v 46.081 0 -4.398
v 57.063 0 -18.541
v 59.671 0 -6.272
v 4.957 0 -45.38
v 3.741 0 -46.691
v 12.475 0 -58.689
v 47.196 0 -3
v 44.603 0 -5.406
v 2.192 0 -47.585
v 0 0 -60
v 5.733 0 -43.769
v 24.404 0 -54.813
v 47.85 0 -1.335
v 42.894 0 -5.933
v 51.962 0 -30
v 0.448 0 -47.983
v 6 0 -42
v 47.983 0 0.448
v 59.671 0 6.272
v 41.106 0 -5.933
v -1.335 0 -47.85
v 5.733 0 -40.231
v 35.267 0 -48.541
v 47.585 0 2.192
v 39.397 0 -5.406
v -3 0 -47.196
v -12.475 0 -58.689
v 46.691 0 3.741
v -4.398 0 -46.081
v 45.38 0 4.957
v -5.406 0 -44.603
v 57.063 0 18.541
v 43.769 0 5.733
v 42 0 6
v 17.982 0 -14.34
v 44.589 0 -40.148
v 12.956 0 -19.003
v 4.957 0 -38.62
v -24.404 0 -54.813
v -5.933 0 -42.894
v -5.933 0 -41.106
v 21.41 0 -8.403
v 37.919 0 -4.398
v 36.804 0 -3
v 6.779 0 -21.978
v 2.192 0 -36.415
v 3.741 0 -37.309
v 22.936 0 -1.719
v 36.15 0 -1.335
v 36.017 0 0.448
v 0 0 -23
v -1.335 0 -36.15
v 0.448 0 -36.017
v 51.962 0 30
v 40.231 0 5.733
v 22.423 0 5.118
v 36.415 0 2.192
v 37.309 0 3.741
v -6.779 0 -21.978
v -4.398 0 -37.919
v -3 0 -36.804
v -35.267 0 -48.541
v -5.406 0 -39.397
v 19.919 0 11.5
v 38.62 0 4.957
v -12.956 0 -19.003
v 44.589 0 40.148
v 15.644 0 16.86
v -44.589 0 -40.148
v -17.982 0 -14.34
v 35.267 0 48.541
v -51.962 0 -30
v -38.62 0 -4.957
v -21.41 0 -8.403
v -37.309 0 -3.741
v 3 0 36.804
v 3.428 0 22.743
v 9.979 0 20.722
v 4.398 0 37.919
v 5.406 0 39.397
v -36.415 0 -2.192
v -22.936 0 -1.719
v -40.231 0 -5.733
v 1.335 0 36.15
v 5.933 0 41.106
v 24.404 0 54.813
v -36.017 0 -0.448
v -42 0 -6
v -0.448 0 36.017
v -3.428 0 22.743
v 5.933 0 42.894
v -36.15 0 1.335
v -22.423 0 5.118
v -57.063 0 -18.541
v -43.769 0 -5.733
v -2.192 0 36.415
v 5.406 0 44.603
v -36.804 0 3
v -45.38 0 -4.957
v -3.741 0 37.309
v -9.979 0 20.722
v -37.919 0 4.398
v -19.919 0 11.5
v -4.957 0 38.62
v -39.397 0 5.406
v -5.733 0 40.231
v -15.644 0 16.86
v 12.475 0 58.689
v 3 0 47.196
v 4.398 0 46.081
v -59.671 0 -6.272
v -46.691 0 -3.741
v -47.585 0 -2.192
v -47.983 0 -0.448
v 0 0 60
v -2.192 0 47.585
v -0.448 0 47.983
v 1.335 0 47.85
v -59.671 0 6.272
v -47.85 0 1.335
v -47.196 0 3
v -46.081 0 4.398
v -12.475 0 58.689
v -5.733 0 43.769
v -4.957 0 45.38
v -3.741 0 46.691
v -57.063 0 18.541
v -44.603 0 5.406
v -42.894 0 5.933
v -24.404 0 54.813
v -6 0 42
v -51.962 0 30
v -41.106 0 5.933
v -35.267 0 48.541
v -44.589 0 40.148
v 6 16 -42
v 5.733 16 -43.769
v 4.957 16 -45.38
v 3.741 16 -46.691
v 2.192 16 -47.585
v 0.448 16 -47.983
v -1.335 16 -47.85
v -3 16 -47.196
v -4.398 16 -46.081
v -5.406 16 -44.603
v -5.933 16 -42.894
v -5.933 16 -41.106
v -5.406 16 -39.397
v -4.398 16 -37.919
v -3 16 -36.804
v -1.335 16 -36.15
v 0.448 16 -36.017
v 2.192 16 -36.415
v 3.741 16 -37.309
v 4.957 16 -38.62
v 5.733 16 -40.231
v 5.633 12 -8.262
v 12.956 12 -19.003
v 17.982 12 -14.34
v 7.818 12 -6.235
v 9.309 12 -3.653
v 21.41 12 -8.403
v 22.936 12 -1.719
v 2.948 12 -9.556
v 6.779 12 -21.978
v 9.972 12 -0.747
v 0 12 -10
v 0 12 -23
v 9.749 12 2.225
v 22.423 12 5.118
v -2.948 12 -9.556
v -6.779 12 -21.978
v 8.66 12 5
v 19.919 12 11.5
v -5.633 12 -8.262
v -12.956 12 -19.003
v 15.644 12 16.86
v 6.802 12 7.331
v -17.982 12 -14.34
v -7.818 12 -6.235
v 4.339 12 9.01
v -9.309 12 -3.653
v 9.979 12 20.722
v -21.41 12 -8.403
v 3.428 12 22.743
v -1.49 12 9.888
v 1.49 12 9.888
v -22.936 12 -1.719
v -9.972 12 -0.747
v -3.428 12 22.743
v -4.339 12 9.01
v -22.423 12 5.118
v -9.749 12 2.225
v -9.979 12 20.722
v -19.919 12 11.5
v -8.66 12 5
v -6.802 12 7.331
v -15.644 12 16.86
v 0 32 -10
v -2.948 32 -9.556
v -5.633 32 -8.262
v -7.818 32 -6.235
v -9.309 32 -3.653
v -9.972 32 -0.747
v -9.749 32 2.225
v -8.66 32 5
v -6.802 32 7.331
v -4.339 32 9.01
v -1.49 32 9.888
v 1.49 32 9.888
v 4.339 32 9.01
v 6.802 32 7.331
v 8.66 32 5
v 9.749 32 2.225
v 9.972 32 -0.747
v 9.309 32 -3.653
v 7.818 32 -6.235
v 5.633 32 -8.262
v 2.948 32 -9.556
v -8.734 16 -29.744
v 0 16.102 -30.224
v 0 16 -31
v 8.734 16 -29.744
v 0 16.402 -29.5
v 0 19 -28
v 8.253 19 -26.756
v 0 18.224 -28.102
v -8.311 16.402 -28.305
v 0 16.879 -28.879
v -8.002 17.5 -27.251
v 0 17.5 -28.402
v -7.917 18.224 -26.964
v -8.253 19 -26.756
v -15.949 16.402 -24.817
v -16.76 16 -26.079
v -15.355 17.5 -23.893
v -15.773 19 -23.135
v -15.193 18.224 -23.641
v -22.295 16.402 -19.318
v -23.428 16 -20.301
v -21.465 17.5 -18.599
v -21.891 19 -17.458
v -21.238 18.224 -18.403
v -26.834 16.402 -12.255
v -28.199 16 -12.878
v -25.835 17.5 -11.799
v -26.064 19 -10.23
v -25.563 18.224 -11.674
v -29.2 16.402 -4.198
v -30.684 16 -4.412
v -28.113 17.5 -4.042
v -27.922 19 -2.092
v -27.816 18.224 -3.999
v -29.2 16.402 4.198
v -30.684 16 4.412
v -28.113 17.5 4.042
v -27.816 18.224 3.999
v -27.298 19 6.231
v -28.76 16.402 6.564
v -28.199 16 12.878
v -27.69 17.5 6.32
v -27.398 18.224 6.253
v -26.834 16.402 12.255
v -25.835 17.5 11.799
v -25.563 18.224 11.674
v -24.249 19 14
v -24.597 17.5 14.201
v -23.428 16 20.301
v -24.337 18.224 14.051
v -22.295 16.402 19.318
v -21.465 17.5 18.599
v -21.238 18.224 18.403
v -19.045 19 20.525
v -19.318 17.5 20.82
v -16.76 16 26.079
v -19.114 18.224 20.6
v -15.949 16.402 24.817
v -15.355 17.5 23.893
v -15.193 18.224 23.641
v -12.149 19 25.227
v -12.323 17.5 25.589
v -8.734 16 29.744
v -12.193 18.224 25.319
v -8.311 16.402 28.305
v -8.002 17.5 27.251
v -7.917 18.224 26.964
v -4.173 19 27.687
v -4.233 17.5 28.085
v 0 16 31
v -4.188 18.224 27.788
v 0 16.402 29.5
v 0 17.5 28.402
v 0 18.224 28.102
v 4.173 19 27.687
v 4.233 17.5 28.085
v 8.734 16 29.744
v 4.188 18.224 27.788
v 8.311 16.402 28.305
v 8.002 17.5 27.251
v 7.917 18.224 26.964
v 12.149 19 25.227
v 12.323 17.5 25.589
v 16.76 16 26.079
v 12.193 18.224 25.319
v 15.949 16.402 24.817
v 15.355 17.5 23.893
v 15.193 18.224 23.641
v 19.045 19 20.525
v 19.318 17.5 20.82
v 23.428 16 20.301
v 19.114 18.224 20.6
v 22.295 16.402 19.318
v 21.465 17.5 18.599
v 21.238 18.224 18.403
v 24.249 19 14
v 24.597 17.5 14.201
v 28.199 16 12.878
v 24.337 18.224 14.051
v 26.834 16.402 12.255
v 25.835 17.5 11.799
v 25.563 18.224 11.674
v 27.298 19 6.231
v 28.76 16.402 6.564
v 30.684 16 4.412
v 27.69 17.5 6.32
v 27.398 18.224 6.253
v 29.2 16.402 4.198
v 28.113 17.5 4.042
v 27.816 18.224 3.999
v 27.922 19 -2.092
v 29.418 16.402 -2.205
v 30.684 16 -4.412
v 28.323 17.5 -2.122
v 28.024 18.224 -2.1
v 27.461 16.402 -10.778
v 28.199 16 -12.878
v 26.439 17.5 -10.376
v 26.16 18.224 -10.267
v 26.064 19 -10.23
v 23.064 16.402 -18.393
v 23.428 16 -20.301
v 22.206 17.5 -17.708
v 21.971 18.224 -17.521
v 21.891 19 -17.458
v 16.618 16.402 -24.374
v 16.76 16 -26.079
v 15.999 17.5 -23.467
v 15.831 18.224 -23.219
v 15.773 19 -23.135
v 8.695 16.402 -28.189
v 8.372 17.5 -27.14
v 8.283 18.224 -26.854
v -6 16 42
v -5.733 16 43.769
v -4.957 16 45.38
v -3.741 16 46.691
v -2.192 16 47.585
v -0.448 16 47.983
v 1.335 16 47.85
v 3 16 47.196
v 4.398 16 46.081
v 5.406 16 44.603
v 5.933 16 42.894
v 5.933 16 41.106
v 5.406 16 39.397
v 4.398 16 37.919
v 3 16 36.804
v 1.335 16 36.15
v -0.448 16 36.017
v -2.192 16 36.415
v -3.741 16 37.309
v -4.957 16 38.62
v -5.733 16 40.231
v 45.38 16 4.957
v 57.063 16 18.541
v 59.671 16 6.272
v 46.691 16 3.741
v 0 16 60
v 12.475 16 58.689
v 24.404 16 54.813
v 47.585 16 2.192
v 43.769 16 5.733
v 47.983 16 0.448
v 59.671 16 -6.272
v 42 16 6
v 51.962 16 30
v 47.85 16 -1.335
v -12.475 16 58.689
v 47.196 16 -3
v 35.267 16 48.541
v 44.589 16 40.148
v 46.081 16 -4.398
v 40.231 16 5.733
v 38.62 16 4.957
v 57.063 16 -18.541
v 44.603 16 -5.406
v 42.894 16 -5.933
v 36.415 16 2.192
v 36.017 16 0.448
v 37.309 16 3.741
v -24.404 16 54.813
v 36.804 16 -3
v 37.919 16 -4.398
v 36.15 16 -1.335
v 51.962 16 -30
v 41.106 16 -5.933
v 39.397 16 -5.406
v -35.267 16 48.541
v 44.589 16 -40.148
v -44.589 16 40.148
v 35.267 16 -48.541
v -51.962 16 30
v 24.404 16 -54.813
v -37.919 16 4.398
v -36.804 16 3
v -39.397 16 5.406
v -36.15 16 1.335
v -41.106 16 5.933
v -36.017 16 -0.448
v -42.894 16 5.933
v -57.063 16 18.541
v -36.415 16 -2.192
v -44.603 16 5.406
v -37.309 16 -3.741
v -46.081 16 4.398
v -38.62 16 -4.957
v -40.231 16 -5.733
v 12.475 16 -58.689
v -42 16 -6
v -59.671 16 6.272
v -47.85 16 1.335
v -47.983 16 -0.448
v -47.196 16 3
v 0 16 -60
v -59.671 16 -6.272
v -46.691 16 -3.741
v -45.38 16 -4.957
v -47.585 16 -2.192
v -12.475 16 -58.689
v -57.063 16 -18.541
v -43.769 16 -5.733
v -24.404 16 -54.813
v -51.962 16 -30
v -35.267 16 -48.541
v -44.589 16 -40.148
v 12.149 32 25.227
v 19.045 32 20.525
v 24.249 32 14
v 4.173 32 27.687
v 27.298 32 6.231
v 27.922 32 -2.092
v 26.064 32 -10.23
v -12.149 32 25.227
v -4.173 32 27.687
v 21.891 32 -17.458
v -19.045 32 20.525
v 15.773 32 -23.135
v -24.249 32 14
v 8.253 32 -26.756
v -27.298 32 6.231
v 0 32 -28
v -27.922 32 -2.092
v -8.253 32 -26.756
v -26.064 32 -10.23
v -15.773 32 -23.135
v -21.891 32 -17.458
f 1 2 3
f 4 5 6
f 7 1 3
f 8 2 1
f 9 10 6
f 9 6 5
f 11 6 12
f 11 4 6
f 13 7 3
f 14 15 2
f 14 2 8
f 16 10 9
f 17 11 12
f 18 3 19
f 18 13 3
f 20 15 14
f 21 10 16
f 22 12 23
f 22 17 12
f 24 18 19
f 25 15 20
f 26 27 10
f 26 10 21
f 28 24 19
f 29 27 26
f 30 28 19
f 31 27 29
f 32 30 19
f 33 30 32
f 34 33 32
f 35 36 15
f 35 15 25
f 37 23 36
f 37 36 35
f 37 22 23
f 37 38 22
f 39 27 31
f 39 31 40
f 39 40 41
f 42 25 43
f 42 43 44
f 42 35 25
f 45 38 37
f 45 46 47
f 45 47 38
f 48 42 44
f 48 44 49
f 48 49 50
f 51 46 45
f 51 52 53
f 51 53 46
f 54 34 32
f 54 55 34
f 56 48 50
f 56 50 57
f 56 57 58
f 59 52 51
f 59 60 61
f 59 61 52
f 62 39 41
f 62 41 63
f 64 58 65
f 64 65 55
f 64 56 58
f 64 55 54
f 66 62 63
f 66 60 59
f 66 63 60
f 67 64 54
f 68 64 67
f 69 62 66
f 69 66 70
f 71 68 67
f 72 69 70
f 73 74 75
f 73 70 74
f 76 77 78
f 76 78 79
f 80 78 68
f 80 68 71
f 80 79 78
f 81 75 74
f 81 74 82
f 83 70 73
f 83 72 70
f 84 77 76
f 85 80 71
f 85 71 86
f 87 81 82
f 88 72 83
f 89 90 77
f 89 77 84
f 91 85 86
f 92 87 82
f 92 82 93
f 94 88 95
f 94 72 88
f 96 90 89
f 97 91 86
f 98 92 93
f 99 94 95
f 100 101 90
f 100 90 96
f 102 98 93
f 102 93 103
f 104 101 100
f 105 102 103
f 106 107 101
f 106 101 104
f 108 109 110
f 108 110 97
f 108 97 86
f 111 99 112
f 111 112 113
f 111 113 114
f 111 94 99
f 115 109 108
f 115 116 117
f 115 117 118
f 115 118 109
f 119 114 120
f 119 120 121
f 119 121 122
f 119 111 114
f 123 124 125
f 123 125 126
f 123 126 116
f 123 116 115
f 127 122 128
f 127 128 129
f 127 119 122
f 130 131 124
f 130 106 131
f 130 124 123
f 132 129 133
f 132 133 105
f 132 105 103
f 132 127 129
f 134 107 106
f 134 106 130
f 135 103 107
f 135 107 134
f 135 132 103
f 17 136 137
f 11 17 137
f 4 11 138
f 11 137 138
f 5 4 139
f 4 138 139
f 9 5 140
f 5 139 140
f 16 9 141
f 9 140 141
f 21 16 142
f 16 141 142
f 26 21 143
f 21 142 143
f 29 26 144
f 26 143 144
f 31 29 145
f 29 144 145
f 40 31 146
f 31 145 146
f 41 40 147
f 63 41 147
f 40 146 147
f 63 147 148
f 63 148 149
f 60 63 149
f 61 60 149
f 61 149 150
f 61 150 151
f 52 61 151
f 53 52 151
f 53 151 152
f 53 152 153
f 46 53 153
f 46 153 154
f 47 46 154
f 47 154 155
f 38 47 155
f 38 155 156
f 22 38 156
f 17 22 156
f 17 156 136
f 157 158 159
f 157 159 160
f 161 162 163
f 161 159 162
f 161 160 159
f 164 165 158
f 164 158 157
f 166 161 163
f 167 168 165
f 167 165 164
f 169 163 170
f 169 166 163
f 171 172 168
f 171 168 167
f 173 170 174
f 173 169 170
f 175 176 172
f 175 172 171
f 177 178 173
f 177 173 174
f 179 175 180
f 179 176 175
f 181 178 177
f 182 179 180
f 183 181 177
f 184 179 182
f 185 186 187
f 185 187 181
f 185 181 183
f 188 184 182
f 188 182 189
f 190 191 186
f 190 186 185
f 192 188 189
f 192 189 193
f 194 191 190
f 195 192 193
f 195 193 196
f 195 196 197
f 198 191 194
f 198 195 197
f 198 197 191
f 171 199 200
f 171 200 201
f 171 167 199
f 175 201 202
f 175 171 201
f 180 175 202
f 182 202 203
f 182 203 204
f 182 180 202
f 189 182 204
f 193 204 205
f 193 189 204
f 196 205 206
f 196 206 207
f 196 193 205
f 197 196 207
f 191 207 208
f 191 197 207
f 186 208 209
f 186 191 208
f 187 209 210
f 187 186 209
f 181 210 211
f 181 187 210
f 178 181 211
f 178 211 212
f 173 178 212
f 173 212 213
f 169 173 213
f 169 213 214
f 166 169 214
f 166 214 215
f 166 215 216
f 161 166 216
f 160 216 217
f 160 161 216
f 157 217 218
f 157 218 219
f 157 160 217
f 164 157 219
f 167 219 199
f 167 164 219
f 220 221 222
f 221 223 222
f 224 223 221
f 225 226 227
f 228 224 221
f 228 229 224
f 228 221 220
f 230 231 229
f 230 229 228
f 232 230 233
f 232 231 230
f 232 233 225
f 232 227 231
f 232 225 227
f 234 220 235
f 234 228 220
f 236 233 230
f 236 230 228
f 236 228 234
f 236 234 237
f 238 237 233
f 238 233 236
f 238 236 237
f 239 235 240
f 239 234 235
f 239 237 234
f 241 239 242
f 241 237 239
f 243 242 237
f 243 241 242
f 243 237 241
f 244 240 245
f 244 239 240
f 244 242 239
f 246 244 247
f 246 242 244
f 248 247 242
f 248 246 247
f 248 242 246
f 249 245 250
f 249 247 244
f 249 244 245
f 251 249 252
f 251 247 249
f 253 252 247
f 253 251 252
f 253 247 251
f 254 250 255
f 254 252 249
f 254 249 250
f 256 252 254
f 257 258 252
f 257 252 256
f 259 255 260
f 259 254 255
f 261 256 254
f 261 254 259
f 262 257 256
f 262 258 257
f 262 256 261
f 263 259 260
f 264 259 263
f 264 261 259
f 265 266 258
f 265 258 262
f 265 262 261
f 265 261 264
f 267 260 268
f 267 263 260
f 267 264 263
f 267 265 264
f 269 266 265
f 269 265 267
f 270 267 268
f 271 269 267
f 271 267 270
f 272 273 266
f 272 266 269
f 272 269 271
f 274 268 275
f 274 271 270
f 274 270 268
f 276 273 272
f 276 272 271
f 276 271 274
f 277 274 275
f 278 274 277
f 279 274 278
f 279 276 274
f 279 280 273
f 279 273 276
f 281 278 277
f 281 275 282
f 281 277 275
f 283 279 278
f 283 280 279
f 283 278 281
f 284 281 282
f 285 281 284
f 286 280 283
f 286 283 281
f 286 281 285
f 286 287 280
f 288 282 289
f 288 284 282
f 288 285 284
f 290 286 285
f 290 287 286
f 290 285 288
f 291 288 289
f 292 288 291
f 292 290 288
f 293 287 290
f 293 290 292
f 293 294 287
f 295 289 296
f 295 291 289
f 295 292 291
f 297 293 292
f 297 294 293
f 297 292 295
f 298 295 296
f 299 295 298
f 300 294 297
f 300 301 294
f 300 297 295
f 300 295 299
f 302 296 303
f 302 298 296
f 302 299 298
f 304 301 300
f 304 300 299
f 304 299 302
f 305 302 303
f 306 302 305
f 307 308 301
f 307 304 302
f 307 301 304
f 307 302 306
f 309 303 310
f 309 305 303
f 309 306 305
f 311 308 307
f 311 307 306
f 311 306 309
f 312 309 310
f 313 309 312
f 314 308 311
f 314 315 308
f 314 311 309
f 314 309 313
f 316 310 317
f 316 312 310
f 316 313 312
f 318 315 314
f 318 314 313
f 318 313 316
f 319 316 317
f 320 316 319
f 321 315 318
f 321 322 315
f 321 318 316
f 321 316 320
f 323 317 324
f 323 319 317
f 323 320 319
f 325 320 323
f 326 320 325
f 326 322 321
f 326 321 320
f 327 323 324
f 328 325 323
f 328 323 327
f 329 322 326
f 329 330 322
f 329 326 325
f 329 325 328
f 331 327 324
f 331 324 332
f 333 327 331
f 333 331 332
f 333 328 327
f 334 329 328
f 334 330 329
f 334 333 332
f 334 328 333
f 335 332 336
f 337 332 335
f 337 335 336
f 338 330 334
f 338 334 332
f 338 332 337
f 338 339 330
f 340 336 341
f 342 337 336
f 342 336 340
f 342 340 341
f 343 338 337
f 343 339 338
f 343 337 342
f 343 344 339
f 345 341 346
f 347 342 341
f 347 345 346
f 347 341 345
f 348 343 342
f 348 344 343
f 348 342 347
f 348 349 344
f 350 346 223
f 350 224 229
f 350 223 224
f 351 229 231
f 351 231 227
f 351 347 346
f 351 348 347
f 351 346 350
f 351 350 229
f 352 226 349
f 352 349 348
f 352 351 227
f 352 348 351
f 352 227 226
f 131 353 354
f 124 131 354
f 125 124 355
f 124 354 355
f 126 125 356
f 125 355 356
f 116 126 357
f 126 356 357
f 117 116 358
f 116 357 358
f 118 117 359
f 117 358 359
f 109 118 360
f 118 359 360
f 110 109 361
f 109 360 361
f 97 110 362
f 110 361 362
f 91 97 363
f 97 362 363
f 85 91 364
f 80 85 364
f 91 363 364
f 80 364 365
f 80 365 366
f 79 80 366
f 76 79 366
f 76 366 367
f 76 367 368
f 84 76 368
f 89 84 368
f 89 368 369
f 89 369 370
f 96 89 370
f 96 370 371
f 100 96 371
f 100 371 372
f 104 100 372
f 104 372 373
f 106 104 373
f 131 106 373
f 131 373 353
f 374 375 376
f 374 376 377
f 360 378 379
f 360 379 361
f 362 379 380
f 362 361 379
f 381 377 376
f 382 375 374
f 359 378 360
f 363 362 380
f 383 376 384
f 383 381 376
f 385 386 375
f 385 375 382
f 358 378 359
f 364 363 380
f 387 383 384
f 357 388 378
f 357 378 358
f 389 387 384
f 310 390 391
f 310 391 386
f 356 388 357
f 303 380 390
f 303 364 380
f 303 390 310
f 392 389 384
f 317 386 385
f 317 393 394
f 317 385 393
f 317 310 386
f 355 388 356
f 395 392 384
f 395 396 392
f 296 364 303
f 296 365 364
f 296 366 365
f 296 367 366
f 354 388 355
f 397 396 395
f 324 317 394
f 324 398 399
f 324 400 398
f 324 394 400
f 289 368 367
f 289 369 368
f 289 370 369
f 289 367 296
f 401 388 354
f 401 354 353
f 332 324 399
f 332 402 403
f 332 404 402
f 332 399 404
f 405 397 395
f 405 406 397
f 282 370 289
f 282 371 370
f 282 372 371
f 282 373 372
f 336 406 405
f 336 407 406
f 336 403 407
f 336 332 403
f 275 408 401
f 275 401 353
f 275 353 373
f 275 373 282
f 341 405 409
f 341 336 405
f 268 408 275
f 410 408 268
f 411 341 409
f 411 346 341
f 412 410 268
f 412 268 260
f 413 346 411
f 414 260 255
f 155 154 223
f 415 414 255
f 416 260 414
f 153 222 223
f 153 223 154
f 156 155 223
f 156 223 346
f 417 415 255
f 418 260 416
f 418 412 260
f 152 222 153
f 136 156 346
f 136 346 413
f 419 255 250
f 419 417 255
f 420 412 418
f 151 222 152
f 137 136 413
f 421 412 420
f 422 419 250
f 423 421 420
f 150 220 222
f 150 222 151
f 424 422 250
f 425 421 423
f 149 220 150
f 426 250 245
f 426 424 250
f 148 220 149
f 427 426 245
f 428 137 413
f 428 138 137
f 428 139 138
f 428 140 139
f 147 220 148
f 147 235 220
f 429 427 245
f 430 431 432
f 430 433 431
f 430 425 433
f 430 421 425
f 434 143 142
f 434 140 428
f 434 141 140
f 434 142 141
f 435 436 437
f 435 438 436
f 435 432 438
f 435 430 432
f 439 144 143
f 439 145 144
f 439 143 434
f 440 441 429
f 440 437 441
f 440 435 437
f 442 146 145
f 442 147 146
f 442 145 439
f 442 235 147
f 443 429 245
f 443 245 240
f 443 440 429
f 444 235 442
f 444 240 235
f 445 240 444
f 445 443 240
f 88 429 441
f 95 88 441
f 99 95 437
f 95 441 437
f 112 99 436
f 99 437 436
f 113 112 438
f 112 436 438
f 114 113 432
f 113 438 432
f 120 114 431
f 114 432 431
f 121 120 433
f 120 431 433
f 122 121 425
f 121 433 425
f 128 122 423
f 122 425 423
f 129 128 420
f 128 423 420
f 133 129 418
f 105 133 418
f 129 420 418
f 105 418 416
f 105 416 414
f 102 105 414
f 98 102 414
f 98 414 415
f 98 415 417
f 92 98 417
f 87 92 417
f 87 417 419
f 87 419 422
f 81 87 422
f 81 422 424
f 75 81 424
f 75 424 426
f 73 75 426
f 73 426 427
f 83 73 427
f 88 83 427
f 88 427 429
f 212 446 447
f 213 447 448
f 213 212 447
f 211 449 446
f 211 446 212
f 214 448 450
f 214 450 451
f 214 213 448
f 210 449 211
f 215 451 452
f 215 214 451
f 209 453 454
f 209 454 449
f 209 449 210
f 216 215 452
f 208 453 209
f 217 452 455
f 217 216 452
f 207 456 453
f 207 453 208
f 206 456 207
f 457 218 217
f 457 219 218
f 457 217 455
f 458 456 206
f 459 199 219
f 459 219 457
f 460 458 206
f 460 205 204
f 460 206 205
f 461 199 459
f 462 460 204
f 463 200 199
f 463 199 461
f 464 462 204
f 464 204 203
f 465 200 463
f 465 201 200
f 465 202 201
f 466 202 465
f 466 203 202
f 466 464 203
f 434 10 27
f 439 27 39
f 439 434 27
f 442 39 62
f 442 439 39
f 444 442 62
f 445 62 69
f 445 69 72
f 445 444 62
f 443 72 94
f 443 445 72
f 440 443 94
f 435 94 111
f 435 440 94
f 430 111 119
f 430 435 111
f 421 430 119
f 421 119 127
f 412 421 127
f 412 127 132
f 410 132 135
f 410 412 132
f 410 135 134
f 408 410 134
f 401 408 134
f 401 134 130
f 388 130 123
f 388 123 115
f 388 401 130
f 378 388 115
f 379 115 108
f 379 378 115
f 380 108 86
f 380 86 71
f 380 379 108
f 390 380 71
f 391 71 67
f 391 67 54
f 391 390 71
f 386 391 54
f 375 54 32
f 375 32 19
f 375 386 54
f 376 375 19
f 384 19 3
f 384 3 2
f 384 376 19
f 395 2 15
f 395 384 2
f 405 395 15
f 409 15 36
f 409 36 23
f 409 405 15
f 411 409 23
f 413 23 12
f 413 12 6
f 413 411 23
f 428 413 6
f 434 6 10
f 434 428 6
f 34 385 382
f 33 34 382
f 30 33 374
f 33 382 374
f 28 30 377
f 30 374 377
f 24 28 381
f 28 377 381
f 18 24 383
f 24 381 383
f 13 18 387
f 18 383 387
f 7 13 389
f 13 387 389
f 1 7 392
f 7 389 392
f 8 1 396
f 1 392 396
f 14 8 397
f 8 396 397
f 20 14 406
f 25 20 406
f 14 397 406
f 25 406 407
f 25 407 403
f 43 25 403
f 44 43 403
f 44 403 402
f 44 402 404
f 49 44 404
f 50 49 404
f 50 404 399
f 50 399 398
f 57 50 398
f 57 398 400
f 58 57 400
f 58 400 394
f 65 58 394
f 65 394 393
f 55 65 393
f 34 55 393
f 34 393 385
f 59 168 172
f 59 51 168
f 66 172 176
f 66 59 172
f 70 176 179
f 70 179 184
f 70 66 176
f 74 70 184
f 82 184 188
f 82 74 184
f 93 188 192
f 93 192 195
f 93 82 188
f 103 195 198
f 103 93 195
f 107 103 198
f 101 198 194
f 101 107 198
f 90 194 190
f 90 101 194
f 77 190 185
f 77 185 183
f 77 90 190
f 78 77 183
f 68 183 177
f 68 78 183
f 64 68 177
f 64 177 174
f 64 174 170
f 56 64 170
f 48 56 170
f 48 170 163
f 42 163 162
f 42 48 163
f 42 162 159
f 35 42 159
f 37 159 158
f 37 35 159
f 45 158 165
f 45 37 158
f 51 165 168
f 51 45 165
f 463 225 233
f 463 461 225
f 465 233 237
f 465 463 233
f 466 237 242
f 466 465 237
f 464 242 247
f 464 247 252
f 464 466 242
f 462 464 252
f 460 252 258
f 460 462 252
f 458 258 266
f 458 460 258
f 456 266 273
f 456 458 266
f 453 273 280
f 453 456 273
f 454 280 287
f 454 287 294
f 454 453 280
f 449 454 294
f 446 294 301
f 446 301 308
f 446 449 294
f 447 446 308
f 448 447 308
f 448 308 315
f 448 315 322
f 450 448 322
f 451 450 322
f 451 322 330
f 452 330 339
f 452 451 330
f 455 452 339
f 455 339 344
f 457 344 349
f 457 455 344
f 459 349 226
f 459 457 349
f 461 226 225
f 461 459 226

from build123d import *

# Parameters (mm, degrees)
F_12_0MM_DOWEL_HOLE1_D = 12
CIRPATTERN1_COUNT      = 4


with BuildPart() as part:
    # Sketch1 → Revolve1 (revolve)
    with BuildSketch(Plane.XY, mode=Mode.PRIVATE) as revolve1_sk:
        with BuildLine():
            Line((-60, 0), (-60, 16))
            Line((-60, 16), (-31, 16))
            ThreePointArc((-31, 16), (-28.878679656, 16.878679656), (-28, 19))
            Line((-28, 19), (-28, 32))
            Line((-28, 32), (-10, 32))
            Line((-10, 32), (-10, 12))
            Line((-10, 12), (-23, 12))
            Line((-23, 12), (-23, 0))
            Line((-23, 0), (-60, 0))
        make_face()
    revolve(revolve1_sk.sketch.rotate(Axis((0, 0, 0), (0, 1, 0)), 270), axis=Axis((0, 0, 0), (0, 1, 0)))

    # Ø12.0mm Dowel Hole1 (through all)
    with Locations(Plane.XZ):
        with Locations((0, 42)):
            f_12_0mm_dowel_hole1 = Hole(F_12_0MM_DOWEL_HOLE1_D / 2)

    # CirPattern1: Ø12.0mm Dowel Hole1 ×4 about axis
    cirpattern1_axis = Axis((0, 0, 0), (0, 1, 0))
    for i in range(1, CIRPATTERN1_COUNT):
        add(f_12_0mm_dowel_hole1.rotate(cirpattern1_axis, i * 360 / CIRPATTERN1_COUNT), mode=Mode.SUBTRACT)


solid = part.part
